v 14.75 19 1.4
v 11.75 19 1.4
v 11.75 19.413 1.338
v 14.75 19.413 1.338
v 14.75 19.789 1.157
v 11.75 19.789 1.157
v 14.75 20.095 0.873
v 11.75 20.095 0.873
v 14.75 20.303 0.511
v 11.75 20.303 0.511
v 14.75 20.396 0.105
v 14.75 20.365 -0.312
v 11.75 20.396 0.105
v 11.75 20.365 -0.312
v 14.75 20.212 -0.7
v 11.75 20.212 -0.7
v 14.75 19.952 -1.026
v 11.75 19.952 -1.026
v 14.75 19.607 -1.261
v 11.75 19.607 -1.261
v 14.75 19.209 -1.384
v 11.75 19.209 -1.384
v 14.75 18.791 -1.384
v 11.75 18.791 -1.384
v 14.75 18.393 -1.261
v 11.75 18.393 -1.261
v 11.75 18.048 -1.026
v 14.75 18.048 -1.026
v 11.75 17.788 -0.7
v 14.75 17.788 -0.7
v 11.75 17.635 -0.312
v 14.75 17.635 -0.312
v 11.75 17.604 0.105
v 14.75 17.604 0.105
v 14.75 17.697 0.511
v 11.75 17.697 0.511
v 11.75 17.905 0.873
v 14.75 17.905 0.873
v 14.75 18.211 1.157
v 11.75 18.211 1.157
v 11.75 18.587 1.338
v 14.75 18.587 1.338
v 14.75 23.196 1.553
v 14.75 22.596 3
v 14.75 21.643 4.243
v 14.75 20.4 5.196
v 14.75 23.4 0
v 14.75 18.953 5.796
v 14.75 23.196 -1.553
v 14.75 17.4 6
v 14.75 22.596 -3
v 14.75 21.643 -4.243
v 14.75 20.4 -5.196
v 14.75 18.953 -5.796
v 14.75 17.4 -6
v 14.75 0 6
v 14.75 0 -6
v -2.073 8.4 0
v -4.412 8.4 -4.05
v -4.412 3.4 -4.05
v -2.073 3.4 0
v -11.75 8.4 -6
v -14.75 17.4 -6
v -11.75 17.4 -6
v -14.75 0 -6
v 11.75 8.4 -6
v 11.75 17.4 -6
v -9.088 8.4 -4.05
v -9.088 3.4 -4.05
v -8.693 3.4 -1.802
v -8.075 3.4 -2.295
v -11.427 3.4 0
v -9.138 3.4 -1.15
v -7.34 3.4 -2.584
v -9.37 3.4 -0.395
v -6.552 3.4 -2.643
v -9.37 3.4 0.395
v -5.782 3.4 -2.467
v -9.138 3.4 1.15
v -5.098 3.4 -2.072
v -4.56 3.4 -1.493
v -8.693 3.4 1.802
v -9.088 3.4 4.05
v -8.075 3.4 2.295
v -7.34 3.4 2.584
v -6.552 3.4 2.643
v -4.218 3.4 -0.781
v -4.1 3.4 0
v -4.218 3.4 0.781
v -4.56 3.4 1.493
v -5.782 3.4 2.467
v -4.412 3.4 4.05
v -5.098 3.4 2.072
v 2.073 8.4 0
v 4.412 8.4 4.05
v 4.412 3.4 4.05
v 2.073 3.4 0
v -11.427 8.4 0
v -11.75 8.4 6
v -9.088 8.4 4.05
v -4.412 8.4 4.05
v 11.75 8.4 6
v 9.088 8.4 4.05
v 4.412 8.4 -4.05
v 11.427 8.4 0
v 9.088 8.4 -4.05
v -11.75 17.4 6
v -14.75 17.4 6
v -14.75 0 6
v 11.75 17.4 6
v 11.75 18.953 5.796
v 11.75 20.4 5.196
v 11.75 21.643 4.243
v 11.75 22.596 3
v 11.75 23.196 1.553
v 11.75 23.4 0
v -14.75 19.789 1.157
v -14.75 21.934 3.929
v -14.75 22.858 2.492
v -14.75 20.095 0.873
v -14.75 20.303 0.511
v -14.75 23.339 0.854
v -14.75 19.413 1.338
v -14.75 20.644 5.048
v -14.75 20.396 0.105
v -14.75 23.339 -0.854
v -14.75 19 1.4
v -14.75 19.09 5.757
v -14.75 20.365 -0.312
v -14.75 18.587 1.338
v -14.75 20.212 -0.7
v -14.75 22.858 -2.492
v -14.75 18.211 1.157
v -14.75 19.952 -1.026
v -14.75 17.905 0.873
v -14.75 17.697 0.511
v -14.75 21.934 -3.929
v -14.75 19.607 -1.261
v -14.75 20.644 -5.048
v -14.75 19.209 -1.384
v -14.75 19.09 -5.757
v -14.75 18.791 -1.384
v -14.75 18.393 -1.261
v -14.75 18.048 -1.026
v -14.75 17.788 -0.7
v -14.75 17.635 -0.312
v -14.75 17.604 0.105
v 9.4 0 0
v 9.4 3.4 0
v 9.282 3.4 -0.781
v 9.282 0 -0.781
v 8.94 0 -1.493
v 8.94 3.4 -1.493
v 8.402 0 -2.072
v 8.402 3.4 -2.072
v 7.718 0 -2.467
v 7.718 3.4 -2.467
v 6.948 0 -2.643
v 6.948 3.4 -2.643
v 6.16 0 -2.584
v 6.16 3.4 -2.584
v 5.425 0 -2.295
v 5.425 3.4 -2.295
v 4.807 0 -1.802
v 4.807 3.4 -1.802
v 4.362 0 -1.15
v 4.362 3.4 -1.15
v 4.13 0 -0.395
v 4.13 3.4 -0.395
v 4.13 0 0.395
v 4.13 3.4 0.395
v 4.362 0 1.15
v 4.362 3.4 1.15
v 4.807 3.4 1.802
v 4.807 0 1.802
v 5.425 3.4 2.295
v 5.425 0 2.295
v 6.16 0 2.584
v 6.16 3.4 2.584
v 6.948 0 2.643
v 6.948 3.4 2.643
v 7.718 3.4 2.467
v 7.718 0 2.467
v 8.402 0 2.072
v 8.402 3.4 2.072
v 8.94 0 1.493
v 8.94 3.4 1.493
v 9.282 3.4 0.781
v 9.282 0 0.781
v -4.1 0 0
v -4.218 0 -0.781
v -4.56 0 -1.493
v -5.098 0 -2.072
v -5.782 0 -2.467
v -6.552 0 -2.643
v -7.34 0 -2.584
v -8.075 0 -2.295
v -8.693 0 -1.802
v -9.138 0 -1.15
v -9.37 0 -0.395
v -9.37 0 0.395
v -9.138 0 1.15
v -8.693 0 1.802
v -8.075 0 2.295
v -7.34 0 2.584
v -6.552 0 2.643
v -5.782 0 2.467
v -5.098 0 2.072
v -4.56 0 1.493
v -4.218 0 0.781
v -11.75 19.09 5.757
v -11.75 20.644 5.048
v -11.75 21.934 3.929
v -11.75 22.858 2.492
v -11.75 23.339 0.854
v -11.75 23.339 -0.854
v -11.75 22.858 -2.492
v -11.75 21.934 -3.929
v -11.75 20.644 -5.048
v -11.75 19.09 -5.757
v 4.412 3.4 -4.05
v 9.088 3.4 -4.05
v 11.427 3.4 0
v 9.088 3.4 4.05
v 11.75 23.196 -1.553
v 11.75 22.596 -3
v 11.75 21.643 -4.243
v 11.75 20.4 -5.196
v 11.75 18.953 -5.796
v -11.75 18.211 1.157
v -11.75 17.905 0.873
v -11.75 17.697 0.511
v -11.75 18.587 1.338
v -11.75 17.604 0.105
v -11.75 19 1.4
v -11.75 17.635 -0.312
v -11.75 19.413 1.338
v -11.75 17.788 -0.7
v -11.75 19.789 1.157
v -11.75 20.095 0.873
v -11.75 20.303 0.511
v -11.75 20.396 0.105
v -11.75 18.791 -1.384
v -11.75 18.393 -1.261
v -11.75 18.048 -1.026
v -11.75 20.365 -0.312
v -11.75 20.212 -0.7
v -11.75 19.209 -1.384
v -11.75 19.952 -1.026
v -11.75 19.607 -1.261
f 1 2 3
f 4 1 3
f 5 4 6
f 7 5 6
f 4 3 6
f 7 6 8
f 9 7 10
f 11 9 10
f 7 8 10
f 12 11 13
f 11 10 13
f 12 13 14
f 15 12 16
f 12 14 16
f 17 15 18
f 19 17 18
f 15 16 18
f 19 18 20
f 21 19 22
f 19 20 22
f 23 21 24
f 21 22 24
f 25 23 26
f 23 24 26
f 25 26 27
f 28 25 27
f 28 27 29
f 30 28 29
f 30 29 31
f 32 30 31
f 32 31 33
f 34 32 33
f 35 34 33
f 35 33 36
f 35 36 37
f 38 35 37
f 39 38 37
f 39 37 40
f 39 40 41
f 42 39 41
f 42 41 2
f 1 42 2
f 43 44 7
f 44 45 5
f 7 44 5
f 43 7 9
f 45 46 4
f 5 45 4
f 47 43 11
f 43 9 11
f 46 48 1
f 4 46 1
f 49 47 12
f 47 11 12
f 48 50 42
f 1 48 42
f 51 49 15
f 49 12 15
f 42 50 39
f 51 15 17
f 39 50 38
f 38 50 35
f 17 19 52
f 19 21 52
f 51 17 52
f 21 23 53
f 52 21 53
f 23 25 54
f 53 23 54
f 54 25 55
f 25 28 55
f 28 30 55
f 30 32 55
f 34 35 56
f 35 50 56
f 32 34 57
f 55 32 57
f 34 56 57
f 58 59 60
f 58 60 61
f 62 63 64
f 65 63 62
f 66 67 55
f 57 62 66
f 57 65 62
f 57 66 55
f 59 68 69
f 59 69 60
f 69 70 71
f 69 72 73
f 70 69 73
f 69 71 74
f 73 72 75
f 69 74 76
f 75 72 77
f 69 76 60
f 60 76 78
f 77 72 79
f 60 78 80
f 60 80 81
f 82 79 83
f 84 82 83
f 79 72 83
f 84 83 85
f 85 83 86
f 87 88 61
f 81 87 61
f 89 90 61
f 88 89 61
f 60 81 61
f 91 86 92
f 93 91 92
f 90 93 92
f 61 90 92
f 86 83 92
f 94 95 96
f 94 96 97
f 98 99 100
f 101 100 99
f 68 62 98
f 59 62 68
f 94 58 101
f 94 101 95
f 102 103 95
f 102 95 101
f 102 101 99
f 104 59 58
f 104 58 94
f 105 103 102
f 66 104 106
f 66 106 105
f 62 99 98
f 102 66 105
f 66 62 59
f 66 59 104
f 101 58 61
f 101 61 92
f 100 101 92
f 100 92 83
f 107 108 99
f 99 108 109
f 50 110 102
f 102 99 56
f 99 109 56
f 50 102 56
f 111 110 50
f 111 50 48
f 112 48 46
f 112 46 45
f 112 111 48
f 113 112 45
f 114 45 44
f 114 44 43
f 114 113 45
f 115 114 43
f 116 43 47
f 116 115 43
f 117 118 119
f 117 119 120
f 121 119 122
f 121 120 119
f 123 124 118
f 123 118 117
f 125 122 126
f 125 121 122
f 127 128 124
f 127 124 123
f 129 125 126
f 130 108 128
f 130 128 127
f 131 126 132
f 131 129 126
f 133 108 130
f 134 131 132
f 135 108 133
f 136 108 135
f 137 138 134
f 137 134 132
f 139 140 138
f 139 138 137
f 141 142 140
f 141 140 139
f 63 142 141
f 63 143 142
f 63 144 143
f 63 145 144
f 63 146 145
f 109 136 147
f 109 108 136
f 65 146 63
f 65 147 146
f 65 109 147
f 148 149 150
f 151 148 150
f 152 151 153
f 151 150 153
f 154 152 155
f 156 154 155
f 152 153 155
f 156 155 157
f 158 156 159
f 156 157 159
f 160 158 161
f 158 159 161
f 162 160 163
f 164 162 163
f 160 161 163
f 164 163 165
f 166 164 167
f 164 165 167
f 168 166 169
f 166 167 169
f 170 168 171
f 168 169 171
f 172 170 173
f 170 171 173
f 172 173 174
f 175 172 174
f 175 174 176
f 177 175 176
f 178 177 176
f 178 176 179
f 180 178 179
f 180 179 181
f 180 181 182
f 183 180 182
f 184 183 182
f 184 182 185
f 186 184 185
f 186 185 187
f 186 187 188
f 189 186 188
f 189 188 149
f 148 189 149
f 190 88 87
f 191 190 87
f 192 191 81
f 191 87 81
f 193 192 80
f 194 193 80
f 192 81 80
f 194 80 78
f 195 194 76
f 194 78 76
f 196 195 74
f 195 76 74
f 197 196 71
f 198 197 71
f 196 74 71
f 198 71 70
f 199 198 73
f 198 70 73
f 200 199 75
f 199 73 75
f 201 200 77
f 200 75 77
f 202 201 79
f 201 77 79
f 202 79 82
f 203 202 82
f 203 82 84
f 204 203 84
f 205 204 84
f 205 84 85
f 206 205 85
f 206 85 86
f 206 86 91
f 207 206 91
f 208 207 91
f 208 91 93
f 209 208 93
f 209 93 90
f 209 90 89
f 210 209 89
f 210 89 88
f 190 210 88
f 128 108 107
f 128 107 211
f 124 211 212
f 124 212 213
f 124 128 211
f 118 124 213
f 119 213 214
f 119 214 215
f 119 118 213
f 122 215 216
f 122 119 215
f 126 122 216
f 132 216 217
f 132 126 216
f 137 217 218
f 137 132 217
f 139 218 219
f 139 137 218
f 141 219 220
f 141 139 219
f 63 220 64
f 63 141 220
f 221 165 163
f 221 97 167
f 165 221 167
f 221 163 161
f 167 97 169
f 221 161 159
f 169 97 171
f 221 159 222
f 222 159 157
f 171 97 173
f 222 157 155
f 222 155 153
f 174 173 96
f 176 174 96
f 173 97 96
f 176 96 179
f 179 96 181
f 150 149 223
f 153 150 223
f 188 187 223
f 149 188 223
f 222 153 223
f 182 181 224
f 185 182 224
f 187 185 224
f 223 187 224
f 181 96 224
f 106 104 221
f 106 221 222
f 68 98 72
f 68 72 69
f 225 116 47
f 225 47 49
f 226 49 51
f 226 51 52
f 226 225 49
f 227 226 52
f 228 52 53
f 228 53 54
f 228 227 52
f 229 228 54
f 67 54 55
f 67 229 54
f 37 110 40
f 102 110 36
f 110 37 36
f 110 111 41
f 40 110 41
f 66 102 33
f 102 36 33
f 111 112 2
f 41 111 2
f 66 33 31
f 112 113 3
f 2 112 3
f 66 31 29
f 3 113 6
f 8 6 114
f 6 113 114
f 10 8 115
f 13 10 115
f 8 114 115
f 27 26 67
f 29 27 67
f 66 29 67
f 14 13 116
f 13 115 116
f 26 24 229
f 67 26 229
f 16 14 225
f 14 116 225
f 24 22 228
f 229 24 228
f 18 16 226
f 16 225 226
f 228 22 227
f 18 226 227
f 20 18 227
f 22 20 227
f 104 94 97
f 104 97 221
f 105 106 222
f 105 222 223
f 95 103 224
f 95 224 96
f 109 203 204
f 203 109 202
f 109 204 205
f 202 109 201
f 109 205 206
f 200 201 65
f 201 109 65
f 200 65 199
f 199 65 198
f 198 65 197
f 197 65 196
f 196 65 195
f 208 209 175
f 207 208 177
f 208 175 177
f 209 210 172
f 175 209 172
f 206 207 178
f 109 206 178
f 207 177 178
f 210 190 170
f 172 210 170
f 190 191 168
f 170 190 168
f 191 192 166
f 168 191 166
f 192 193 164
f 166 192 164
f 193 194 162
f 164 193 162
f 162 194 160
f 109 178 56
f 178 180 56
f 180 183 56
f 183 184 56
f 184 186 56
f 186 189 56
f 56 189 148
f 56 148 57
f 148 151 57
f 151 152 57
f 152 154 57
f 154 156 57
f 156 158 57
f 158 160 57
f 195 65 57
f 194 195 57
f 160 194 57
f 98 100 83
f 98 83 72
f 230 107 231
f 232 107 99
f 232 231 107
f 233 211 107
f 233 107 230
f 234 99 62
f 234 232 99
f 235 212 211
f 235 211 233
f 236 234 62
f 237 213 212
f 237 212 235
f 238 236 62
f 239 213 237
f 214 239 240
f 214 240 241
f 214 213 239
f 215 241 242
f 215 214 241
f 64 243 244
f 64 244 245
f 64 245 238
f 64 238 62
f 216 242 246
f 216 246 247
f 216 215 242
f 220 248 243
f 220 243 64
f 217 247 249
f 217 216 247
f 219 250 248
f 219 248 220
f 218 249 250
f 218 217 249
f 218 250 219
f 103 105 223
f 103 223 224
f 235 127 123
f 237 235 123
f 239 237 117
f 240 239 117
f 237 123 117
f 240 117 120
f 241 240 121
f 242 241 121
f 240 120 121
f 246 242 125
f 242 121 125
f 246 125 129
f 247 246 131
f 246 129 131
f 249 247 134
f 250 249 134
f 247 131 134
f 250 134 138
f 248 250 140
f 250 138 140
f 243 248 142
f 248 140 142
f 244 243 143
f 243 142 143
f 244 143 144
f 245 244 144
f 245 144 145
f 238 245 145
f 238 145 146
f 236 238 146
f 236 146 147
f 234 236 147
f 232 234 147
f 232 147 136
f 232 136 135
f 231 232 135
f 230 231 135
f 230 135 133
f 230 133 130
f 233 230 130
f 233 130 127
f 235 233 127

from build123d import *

# Parameters (mm, degrees)
SKETCH_1_W          = 29.5
SKETCH_1_H          = 12
EXTRUDE_1_DEPTH     = 23.4
SKETCH_3_W          = 23.5
SKETCH_3_H          = 12
CUT_EXTRUDE_1_DEPTH = 15
SKETCH_4_R          = 1.4
CUT_EXTRUDE_2_DEPTH = 39.12886046
FILLET_1_RADIUS     = 6
FILLET_1_LENGTH     = 3
MIRROR_START        = 11.75
MIRROR_1_DEPTH      = 3
HOLE_WIZARD_M5_1_D  = 5.3
CUT_EXTRUDE_4_DEPTH = 5


# Read off the part's stored shape, not the designer's step: 镜向1
with BuildPart() as part:
    # 草图1 → 凸台-拉伸1 (new body)
    with BuildSketch(Plane(origin=(0, 0, 0), x_dir=(1, 0, 0), z_dir=(0, 1, 0))):
        Rectangle(SKETCH_1_W, SKETCH_1_H)
    extrude(amount=EXTRUDE_1_DEPTH)

    # 草图3 → 切除-拉伸1 (cut)
    with BuildSketch(Plane(origin=(0, 23.4, 0), x_dir=(1, 0, 0), z_dir=(0, 1, 0))):
        Rectangle(SKETCH_3_W, SKETCH_3_H)
    extrude(amount=-CUT_EXTRUDE_1_DEPTH, mode=Mode.SUBTRACT)

    # 草图4 → 切除-拉伸2 (cut, through all)
    with BuildSketch(Plane.ZY.offset(14.75)):
        with Locations((0, 19)):
            Circle(SKETCH_4_R)
    extrude(amount=-CUT_EXTRUDE_2_DEPTH, mode=Mode.SUBTRACT)

    # 圆角1: full round fillet: the end face becomes a half cylinder, R = half its width
    fillet_1_face = Plane((-13.25, 23.4, 0), x_dir=(-1, 0, 0), z_dir=(0, 1, 0))  # on the end face: x along it, z out of the body
    fillet_1_slab = fillet_1_face.offset(-FILLET_1_RADIUS / 2) * Box(FILLET_1_LENGTH, 2 * FILLET_1_RADIUS, FILLET_1_RADIUS, mode=Mode.PRIVATE)  # the body's end, R deep
    fillet_1_round = Plane((-13.25, 17.4, 0), x_dir=(0, 1, 0), z_dir=(-1, 0, 0)) * Cylinder(FILLET_1_RADIUS, FILLET_1_LENGTH, mode=Mode.PRIVATE)  # its axis R under the face
    add(fillet_1_slab - fillet_1_round, mode=Mode.SUBTRACT)

    # 镜向1 outline → 镜向1 (cut)
    with BuildSketch(Plane.YZ.offset(MIRROR_START)):
        with BuildLine():
            Line((23.4, 6), (17.4, 6))
            ThreePointArc((17.4, 6), (21.642640687, 4.242640687), (23.4, 0))
            Line((23.4, 0), (23.4, 6))
        make_face()
        with BuildLine():
            Line((23.4, -6), (23.4, 0))
            ThreePointArc((23.4, 0), (21.642640687, -4.242640687), (17.4, -6))
            Line((17.4, -6), (23.4, -6))
        make_face()
    extrude(amount=MIRROR_1_DEPTH, mode=Mode.SUBTRACT)

    # M5 间隙孔1 (through all)
    with Locations(Plane(origin=(0, 0, 0), x_dir=(-1, 0, 0), z_dir=(0, -1, 0))):
        with Locations((-6.75, 0), (6.75, 0)):
            Hole(HOLE_WIZARD_M5_1_D / 2)

    # 草图10 → 切除-拉伸4 (cut)
    with BuildSketch(Plane.XZ.offset(-8.4)):
        Polygon((2.07346282, 0), (4.41173141, -4.05), (9.08826859, -4.05), (11.42653718, 0), (9.08826859, 4.05), (4.41173141, 4.05), align=None)
        Polygon((-11.42653718, 0), (-9.08826859, -4.05), (-4.41173141, -4.05), (-2.07346282, 0), (-4.41173141, 4.05), (-9.08826859, 4.05), align=None)
    extrude(amount=CUT_EXTRUDE_4_DEPTH, mode=Mode.SUBTRACT)


solid = part.part
